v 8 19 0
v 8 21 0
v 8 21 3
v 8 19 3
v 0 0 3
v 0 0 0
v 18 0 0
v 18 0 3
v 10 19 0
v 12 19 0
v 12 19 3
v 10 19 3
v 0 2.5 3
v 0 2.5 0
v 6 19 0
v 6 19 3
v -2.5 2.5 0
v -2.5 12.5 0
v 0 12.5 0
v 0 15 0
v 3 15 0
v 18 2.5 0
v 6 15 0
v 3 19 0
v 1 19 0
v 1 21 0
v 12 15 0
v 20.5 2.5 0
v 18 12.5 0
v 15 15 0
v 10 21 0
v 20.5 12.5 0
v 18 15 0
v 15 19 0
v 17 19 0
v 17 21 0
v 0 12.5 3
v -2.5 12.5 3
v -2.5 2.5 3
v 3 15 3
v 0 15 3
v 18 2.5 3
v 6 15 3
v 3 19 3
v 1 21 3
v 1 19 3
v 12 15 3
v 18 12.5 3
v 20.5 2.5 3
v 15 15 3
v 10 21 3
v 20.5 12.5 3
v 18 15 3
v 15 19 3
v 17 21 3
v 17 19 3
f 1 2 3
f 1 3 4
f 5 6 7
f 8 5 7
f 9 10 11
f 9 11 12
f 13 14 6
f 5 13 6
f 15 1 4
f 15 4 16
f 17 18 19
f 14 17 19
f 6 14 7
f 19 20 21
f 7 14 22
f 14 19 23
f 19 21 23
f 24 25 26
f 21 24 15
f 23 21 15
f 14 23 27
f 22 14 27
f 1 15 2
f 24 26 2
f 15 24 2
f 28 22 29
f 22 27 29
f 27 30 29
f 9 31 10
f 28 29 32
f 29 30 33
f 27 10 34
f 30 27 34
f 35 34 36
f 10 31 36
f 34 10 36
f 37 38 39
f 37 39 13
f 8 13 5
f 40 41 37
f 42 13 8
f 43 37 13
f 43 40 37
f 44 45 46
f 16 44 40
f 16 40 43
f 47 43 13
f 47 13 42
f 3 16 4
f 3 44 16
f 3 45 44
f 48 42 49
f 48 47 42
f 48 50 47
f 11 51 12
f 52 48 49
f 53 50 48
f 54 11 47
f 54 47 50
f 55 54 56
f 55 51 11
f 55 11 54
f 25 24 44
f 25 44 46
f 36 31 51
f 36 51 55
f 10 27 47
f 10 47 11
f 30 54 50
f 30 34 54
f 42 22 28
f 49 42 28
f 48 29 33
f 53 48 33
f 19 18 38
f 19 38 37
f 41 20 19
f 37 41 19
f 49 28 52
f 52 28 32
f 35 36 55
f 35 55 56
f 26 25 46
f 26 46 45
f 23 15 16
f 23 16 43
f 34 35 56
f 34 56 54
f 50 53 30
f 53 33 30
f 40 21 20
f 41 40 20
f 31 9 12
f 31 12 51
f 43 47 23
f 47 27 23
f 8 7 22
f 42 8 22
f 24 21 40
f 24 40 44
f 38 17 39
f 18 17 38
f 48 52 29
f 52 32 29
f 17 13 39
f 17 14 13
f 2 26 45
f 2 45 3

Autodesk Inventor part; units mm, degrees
ref_plane "YZ Plane" through (0, 0, 0) normal (1, 0, 0) x (0, 1, 0)
ref_plane "XZ Plane" through (0, 0, 0) normal (0, 1, 0) x (-1, 0, 0)
ref_plane "XY Plane" through (0, 0, 0) normal (0, 0, 1) x (1, 0, 0)
sketch "Sketch1" plane through (0, 0, 0) normal (0, 0, 1) x (1, 0, 0)
  line L0 (0, 0) -> (18, 0)
  line L1 (18, 0) -> (18, 15)
  line L2 (18, 15) -> (0, 15)
  line L3 (0, 15) -> (0, 0)
  line L4 (20.5, 12.5) -> (18, 12.5)
  line L5 (18, 12.5) -> (18, 2.5)
  line L6 (18, 2.5) -> (20.5, 2.5)
  line L7 (20.5, 2.5) -> (20.5, 12.5)
  line L8 (20.5, 12.5) -> (18, 2.5) construction
  line L9 (18, 12.5) -> (20.5, 2.5) construction
  line L10 (-2.5, 12.5) -> (0, 12.5)
  line L11 (0, 12.5) -> (0, 2.5)
  line L12 (0, 2.5) -> (-2.5, 2.5)
  line L13 (-2.5, 2.5) -> (-2.5, 12.5)
  line L14 (-2.5, 12.5) -> (0, 2.5) construction
  line L15 (0, 12.5) -> (-2.5, 2.5) construction
  line L16 (3, 15) -> (3, 19)
  line L17 (3, 19) -> (1, 19)
  line L18 (1, 19) -> (1, 21)
  line L19 (1, 21) -> (8, 21)
  line L20 (8, 21) -> (8, 19)
  line L21 (8, 19) -> (6, 19)
  line L22 (6, 19) -> (6, 15)
  line L23 (12, 15) -> (12, 19)
  line L24 (12, 19) -> (10, 19)
  line L25 (10, 19) -> (10, 21)
  line L26 (10, 21) -> (17, 21)
  line L27 (17, 21) -> (17, 19)
  line L28 (17, 19) -> (15, 19)
  line L29 (15, 19) -> (19.0944, 19)
  line L30 (15, 19) -> (15, 15)
  point P0 (19.25, 7.5)
  point P1 (-1.25, 7.5)
  point P2 (18, 7.5)
  point P3 (0, 7.5)
  point P4 (0, 12.5)
  dimension "d0" = 18
  dimension "d1" = 15
  dimension "d2" = 2.5
  dimension "d3" = 2.5
  dimension "d4" = 10
  dimension "d5" = 4
  dimension "d6" = 2
  dimension "d7" = 2
  dimension "d8" = 7
  dimension "d9" = 2
  dimension "d10" = 2
  dimension "d11" = 3
  dimension "d21" = 4
  dimension "d22" = 2
  dimension "d23" = 2
  dimension "d24" = 7
  dimension "d25" = 2
  dimension "d26" = 2
  dimension "d27" = 3
extrude "Extrusion1" add sketch "Sketch1" along normal blind 3
properties part number "Spring_holder2"
